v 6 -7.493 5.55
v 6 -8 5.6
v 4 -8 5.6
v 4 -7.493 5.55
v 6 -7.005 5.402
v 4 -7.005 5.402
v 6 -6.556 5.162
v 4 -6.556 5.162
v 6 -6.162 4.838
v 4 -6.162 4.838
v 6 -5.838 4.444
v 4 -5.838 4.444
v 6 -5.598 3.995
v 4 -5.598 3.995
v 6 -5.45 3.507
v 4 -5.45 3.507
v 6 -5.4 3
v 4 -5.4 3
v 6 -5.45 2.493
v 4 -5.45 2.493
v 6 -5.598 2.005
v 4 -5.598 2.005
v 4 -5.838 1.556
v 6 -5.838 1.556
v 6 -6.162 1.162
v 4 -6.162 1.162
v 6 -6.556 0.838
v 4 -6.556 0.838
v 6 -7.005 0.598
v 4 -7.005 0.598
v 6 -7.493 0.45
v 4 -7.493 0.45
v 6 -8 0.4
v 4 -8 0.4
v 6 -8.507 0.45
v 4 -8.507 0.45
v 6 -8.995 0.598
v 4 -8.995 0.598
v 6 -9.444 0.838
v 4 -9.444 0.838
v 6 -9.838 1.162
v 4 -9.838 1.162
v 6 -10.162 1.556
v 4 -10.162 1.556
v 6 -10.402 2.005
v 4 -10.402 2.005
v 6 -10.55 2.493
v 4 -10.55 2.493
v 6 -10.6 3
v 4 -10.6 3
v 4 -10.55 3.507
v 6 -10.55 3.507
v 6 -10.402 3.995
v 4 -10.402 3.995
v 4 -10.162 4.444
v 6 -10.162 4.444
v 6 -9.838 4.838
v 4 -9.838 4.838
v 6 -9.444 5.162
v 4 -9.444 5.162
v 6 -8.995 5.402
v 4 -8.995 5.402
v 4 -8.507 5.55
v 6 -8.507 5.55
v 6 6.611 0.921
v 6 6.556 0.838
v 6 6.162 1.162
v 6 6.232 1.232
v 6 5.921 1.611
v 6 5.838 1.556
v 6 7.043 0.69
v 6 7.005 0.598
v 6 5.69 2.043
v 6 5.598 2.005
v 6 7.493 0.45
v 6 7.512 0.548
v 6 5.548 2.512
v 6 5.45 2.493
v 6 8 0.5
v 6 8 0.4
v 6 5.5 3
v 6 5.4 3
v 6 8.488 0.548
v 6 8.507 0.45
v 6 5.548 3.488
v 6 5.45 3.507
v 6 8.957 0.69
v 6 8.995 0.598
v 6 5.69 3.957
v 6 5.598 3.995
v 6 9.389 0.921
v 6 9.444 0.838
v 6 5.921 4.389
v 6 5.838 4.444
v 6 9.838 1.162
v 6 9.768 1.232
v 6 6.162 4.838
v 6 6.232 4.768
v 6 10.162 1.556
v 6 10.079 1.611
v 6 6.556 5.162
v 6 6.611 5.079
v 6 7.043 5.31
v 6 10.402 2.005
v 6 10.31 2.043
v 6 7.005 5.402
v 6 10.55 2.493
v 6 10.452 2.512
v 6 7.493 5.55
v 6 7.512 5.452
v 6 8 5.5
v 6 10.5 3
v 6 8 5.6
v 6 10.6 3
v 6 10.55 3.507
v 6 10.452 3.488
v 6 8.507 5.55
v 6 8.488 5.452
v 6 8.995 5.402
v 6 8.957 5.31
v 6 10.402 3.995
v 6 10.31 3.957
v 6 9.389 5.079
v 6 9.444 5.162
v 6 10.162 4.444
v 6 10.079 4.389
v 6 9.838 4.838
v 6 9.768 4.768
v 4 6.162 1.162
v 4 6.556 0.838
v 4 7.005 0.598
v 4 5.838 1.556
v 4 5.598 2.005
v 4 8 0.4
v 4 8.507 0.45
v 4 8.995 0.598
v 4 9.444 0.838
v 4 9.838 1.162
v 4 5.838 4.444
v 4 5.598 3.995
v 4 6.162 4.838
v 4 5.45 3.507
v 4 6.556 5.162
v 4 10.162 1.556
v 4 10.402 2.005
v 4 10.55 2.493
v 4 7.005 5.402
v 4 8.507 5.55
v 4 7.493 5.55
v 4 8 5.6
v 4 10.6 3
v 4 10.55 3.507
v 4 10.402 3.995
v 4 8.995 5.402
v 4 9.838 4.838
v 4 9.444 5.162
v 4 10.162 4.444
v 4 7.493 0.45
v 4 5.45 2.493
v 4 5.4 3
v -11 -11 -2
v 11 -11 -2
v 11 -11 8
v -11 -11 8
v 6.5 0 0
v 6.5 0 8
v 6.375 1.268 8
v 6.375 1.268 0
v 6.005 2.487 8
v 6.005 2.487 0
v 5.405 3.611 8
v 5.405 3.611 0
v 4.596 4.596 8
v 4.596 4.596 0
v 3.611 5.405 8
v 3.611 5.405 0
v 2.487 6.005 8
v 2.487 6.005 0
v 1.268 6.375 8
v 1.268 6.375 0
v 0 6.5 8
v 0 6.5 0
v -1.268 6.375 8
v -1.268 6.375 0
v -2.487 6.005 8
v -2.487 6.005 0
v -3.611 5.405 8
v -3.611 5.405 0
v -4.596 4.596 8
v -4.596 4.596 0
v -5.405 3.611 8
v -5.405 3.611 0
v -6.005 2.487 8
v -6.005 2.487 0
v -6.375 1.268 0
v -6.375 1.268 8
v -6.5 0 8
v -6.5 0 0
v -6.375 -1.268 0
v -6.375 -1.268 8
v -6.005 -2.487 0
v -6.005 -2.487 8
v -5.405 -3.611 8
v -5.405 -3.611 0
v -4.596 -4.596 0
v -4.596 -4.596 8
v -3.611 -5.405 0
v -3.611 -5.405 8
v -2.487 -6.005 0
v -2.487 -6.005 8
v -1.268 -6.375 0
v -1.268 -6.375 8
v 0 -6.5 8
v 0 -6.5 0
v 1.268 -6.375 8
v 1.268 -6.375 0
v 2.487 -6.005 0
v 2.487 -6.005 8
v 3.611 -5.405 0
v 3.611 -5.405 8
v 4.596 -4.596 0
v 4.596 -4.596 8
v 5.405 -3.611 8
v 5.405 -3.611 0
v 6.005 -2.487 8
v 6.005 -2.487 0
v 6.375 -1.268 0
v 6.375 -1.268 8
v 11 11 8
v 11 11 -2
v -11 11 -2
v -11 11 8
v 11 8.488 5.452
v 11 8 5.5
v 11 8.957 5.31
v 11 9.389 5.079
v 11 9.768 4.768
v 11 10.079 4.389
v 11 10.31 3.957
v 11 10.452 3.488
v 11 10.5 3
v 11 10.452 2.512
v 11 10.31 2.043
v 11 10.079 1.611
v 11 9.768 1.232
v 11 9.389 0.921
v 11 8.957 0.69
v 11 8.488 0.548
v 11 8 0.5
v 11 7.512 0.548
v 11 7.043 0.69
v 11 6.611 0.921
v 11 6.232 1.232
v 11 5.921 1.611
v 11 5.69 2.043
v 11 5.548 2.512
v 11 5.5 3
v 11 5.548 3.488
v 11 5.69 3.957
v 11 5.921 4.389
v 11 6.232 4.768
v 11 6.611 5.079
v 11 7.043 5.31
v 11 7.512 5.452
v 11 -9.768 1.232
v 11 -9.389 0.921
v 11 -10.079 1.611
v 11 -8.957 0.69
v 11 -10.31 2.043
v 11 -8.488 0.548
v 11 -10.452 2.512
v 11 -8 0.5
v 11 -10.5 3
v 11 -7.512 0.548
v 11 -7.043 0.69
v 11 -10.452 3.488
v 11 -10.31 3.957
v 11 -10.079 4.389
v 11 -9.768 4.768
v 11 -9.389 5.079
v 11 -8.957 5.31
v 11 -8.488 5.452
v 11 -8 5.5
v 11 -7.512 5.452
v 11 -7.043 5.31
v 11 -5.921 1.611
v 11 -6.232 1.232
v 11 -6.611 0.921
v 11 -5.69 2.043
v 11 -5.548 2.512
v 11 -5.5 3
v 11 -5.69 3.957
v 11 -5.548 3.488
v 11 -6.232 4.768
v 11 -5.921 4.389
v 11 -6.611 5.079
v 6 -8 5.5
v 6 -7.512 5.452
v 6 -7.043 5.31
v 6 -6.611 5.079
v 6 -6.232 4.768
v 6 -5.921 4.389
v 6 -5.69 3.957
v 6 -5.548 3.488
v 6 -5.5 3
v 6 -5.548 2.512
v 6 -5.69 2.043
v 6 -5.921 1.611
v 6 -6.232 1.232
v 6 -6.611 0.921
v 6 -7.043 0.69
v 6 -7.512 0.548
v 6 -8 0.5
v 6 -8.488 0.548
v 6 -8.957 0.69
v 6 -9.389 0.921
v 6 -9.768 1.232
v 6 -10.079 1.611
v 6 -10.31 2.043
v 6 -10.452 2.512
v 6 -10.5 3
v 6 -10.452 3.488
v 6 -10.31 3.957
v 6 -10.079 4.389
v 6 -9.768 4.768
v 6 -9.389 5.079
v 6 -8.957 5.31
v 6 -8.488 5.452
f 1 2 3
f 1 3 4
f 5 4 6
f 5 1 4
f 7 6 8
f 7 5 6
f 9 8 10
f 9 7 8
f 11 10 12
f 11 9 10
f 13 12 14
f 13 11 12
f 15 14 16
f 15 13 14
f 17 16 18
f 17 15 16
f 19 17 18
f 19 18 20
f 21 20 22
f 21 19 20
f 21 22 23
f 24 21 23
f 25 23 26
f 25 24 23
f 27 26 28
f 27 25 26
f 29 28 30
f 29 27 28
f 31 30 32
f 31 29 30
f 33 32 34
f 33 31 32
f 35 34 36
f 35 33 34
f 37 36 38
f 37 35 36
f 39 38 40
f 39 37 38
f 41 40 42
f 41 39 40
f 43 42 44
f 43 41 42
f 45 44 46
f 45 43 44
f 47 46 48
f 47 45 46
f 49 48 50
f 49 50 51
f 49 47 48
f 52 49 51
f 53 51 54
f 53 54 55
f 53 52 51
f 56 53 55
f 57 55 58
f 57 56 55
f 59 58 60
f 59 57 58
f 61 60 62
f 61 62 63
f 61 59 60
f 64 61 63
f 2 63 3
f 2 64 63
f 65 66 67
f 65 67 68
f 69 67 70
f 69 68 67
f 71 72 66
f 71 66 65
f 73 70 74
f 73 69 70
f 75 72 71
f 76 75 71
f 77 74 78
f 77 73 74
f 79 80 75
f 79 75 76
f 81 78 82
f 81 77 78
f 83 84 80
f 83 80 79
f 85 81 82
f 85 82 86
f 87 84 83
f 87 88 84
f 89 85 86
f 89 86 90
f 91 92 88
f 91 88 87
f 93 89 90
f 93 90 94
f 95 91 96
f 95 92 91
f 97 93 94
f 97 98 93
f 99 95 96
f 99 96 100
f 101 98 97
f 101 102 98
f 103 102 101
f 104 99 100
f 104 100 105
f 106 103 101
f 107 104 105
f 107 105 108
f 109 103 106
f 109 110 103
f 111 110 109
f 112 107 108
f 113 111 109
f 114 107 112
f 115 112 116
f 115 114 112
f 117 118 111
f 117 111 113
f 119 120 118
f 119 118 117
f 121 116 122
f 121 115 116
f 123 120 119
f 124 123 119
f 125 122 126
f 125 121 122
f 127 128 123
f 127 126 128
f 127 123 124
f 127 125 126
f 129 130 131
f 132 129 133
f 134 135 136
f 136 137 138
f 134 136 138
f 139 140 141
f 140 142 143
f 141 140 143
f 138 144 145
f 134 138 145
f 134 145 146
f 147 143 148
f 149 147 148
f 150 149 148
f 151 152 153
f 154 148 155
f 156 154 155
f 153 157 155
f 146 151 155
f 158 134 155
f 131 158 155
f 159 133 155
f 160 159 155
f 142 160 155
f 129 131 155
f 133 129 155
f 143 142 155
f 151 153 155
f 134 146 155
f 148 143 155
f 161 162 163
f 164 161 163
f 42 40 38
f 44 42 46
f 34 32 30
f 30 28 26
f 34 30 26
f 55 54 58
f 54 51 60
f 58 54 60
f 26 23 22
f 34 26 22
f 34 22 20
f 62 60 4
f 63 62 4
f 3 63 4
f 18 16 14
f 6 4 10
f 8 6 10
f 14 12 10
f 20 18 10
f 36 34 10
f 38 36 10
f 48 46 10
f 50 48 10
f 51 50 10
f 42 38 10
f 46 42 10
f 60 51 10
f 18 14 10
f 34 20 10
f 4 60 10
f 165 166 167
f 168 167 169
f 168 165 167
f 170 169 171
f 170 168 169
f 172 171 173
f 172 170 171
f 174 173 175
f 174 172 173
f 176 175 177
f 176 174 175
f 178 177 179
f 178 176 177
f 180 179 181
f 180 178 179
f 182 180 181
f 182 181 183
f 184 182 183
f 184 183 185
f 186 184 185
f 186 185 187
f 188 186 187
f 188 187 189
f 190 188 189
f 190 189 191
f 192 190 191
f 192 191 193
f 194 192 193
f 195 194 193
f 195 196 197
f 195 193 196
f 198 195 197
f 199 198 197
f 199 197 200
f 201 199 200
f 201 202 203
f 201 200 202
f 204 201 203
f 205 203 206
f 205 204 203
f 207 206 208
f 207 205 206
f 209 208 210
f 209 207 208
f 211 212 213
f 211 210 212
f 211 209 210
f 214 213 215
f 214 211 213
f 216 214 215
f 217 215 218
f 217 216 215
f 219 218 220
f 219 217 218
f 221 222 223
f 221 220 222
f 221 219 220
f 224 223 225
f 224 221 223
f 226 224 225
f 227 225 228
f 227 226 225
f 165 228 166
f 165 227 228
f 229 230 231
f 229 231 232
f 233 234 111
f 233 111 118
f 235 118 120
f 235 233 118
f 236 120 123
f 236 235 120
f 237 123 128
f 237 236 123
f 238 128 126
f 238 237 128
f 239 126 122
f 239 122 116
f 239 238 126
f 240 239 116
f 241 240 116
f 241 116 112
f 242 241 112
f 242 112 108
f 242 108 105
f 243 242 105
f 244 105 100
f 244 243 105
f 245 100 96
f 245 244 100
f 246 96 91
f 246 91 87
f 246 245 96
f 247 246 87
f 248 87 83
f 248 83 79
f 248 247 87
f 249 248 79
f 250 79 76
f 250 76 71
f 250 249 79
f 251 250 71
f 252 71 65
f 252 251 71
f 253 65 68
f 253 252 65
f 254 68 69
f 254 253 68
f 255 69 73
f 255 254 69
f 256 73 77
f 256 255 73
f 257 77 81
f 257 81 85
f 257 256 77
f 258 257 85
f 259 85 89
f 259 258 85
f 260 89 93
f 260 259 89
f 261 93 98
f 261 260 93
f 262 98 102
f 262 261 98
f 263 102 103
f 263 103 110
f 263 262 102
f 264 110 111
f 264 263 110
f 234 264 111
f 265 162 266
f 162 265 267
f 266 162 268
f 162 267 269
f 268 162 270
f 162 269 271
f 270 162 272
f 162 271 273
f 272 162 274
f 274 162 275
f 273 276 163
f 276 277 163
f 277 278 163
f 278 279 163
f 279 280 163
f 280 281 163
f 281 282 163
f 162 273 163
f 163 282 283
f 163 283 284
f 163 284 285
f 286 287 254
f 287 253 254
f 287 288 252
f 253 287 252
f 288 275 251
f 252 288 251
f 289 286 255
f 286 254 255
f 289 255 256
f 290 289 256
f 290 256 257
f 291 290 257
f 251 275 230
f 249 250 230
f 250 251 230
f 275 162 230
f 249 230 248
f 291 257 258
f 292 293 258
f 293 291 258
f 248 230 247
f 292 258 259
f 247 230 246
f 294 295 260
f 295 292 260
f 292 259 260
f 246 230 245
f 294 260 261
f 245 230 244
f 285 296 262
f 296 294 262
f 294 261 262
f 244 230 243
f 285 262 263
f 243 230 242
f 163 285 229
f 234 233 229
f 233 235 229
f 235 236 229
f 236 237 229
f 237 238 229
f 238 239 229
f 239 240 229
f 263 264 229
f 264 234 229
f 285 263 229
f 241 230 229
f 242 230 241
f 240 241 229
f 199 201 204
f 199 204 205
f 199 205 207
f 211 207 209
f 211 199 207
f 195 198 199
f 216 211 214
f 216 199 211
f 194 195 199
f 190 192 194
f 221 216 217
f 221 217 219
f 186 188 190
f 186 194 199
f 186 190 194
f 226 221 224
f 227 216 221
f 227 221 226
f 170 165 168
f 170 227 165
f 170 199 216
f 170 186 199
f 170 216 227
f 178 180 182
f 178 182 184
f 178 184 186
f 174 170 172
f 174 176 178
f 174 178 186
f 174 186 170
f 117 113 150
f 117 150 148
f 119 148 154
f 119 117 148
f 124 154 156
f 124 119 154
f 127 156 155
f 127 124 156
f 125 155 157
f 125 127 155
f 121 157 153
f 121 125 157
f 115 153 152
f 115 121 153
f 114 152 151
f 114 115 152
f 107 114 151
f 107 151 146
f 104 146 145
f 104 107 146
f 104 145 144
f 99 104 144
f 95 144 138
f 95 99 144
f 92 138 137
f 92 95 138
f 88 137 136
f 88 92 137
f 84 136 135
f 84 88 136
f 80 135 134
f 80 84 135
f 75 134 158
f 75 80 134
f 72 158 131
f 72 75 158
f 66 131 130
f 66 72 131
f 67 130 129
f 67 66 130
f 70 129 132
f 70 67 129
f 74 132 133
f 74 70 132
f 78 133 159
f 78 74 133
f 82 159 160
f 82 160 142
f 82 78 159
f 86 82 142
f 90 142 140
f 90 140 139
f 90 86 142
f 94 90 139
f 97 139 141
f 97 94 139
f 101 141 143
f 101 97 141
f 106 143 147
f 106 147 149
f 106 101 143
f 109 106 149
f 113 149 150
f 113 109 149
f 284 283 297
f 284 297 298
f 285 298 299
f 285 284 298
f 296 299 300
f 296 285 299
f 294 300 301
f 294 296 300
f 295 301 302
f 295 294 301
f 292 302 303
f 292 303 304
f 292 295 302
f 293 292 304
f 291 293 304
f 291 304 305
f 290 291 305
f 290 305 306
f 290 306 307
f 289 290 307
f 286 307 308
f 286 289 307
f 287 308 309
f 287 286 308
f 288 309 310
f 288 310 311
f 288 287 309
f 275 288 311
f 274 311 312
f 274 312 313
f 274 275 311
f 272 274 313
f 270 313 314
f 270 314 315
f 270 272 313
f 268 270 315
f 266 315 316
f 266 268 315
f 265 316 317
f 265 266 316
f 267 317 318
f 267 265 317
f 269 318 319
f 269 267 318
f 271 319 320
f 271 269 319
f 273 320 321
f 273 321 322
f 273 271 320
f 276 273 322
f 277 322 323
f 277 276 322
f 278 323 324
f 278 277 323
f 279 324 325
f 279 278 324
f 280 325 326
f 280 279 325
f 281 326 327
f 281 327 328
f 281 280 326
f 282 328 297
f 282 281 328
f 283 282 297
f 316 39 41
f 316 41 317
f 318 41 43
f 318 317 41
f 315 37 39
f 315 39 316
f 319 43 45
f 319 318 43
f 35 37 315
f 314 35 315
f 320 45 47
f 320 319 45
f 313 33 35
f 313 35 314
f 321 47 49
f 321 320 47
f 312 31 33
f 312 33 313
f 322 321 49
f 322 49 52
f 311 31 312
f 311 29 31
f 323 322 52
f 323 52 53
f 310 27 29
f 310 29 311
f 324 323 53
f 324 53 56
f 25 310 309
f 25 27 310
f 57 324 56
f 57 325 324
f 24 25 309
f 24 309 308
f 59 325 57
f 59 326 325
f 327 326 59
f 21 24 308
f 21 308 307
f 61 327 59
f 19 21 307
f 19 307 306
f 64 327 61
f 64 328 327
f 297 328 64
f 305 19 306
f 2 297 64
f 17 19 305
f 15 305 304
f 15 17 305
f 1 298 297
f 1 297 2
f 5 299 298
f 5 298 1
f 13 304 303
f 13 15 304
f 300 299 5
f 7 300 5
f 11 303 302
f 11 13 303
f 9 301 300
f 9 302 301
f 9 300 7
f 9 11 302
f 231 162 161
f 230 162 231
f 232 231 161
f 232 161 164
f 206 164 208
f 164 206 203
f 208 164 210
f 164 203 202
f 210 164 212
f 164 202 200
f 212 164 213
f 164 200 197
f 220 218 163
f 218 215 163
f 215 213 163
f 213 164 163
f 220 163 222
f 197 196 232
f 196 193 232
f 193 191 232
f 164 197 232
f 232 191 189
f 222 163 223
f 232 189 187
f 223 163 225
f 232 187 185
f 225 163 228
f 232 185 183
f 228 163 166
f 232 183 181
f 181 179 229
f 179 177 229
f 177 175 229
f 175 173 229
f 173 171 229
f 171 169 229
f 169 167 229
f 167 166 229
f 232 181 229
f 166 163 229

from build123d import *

# Parameters (mm, degrees)
CYLINDER095_R          = 2.6
CYLINDER095_DEPTH      = 2
CYLINDER096_R          = 2.5
CYLINDER096_DEPTH      = 5
CYLINDER094_R          = 6.5
CYLINDER094_DEPTH      = 130
CYLINDER098_R          = 2.6
CYLINDER098_DEPTH      = 2
CYLINDER097_R          = 2.5
CYLINDER097_DEPTH      = 5
BOX026_W               = 10
BOX026_H               = 22
BOX026_DEPTH           = 22
CUT053_PLACEMENT_ANGLE = 90


with BuildPart() as cilindro095:
    # Cylinder095 → Cylinder095 (new body)
    with BuildSketch(Plane.XY.offset(5)):
        Circle(CYLINDER095_R)
    extrude(amount=CYLINDER095_DEPTH)


with BuildPart() as enganche_lego009:
    # Cylinder096 → Cylinder096 (new body)
    with BuildSketch(Plane.XY):
        Circle(CYLINDER096_R)
    extrude(amount=CYLINDER096_DEPTH)

    # Fusion036: union Cilindro095
    add(cilindro095.part)


with BuildPart() as enganche_lego009_1:
    # Fusion036 placement: moved
    add(enganche_lego009.part.moved(Location((3, 8, -11))))


with BuildPart() as cilindro094:
    # Cylinder094 → Cylinder094 (new body)
    with BuildSketch(Plane(origin=(0, 0, 0), x_dir=(0, 0, -1), z_dir=(1, 0, 0))):
        Circle(CYLINDER094_R)
    extrude(amount=CYLINDER094_DEPTH)


with BuildPart() as cilindro098:
    # Cylinder098 → Cylinder098 (new body)
    with BuildSketch(Plane.XY.offset(5)):
        Circle(CYLINDER098_R)
    extrude(amount=CYLINDER098_DEPTH)


with BuildPart() as fusion038:
    # Cylinder097 → Cylinder097 (new body)
    with BuildSketch(Plane.XY):
        Circle(CYLINDER097_R)
    extrude(amount=CYLINDER097_DEPTH)

    # Fusion037: union Cilindro098
    add(cilindro098.part)


with BuildPart() as fusion038_1:
    # Fusion037 placement: moved
    add(fusion038.part.moved(Location((3, -8, -11))))

    # Fusion038: union enganche_lego009, Cilindro094
    add(enganche_lego009_1.part)
    add(cilindro094.part)


with BuildPart() as lim_barra_pieza:
    # Box026 → Box026 (new body)
    with BuildSketch(Plane(origin=(-2, -11, -11), x_dir=(1, 0, 0), z_dir=(0, 0, 1))):
        with Locations((5, 11)):
            Rectangle(BOX026_W, BOX026_H)
    extrude(amount=BOX026_DEPTH)

    # Cut053: cut Fusion038
    add(fusion038_1.part, mode=Mode.SUBTRACT)


with BuildPart() as lim_barra_pieza_1:
    # Cut053 placement: moved
    add(lim_barra_pieza.part.rotate(Axis((0, 0, 0), (0, -1, 0)), CUT053_PLACEMENT_ANGLE))


solid = lim_barra_pieza_1.part
